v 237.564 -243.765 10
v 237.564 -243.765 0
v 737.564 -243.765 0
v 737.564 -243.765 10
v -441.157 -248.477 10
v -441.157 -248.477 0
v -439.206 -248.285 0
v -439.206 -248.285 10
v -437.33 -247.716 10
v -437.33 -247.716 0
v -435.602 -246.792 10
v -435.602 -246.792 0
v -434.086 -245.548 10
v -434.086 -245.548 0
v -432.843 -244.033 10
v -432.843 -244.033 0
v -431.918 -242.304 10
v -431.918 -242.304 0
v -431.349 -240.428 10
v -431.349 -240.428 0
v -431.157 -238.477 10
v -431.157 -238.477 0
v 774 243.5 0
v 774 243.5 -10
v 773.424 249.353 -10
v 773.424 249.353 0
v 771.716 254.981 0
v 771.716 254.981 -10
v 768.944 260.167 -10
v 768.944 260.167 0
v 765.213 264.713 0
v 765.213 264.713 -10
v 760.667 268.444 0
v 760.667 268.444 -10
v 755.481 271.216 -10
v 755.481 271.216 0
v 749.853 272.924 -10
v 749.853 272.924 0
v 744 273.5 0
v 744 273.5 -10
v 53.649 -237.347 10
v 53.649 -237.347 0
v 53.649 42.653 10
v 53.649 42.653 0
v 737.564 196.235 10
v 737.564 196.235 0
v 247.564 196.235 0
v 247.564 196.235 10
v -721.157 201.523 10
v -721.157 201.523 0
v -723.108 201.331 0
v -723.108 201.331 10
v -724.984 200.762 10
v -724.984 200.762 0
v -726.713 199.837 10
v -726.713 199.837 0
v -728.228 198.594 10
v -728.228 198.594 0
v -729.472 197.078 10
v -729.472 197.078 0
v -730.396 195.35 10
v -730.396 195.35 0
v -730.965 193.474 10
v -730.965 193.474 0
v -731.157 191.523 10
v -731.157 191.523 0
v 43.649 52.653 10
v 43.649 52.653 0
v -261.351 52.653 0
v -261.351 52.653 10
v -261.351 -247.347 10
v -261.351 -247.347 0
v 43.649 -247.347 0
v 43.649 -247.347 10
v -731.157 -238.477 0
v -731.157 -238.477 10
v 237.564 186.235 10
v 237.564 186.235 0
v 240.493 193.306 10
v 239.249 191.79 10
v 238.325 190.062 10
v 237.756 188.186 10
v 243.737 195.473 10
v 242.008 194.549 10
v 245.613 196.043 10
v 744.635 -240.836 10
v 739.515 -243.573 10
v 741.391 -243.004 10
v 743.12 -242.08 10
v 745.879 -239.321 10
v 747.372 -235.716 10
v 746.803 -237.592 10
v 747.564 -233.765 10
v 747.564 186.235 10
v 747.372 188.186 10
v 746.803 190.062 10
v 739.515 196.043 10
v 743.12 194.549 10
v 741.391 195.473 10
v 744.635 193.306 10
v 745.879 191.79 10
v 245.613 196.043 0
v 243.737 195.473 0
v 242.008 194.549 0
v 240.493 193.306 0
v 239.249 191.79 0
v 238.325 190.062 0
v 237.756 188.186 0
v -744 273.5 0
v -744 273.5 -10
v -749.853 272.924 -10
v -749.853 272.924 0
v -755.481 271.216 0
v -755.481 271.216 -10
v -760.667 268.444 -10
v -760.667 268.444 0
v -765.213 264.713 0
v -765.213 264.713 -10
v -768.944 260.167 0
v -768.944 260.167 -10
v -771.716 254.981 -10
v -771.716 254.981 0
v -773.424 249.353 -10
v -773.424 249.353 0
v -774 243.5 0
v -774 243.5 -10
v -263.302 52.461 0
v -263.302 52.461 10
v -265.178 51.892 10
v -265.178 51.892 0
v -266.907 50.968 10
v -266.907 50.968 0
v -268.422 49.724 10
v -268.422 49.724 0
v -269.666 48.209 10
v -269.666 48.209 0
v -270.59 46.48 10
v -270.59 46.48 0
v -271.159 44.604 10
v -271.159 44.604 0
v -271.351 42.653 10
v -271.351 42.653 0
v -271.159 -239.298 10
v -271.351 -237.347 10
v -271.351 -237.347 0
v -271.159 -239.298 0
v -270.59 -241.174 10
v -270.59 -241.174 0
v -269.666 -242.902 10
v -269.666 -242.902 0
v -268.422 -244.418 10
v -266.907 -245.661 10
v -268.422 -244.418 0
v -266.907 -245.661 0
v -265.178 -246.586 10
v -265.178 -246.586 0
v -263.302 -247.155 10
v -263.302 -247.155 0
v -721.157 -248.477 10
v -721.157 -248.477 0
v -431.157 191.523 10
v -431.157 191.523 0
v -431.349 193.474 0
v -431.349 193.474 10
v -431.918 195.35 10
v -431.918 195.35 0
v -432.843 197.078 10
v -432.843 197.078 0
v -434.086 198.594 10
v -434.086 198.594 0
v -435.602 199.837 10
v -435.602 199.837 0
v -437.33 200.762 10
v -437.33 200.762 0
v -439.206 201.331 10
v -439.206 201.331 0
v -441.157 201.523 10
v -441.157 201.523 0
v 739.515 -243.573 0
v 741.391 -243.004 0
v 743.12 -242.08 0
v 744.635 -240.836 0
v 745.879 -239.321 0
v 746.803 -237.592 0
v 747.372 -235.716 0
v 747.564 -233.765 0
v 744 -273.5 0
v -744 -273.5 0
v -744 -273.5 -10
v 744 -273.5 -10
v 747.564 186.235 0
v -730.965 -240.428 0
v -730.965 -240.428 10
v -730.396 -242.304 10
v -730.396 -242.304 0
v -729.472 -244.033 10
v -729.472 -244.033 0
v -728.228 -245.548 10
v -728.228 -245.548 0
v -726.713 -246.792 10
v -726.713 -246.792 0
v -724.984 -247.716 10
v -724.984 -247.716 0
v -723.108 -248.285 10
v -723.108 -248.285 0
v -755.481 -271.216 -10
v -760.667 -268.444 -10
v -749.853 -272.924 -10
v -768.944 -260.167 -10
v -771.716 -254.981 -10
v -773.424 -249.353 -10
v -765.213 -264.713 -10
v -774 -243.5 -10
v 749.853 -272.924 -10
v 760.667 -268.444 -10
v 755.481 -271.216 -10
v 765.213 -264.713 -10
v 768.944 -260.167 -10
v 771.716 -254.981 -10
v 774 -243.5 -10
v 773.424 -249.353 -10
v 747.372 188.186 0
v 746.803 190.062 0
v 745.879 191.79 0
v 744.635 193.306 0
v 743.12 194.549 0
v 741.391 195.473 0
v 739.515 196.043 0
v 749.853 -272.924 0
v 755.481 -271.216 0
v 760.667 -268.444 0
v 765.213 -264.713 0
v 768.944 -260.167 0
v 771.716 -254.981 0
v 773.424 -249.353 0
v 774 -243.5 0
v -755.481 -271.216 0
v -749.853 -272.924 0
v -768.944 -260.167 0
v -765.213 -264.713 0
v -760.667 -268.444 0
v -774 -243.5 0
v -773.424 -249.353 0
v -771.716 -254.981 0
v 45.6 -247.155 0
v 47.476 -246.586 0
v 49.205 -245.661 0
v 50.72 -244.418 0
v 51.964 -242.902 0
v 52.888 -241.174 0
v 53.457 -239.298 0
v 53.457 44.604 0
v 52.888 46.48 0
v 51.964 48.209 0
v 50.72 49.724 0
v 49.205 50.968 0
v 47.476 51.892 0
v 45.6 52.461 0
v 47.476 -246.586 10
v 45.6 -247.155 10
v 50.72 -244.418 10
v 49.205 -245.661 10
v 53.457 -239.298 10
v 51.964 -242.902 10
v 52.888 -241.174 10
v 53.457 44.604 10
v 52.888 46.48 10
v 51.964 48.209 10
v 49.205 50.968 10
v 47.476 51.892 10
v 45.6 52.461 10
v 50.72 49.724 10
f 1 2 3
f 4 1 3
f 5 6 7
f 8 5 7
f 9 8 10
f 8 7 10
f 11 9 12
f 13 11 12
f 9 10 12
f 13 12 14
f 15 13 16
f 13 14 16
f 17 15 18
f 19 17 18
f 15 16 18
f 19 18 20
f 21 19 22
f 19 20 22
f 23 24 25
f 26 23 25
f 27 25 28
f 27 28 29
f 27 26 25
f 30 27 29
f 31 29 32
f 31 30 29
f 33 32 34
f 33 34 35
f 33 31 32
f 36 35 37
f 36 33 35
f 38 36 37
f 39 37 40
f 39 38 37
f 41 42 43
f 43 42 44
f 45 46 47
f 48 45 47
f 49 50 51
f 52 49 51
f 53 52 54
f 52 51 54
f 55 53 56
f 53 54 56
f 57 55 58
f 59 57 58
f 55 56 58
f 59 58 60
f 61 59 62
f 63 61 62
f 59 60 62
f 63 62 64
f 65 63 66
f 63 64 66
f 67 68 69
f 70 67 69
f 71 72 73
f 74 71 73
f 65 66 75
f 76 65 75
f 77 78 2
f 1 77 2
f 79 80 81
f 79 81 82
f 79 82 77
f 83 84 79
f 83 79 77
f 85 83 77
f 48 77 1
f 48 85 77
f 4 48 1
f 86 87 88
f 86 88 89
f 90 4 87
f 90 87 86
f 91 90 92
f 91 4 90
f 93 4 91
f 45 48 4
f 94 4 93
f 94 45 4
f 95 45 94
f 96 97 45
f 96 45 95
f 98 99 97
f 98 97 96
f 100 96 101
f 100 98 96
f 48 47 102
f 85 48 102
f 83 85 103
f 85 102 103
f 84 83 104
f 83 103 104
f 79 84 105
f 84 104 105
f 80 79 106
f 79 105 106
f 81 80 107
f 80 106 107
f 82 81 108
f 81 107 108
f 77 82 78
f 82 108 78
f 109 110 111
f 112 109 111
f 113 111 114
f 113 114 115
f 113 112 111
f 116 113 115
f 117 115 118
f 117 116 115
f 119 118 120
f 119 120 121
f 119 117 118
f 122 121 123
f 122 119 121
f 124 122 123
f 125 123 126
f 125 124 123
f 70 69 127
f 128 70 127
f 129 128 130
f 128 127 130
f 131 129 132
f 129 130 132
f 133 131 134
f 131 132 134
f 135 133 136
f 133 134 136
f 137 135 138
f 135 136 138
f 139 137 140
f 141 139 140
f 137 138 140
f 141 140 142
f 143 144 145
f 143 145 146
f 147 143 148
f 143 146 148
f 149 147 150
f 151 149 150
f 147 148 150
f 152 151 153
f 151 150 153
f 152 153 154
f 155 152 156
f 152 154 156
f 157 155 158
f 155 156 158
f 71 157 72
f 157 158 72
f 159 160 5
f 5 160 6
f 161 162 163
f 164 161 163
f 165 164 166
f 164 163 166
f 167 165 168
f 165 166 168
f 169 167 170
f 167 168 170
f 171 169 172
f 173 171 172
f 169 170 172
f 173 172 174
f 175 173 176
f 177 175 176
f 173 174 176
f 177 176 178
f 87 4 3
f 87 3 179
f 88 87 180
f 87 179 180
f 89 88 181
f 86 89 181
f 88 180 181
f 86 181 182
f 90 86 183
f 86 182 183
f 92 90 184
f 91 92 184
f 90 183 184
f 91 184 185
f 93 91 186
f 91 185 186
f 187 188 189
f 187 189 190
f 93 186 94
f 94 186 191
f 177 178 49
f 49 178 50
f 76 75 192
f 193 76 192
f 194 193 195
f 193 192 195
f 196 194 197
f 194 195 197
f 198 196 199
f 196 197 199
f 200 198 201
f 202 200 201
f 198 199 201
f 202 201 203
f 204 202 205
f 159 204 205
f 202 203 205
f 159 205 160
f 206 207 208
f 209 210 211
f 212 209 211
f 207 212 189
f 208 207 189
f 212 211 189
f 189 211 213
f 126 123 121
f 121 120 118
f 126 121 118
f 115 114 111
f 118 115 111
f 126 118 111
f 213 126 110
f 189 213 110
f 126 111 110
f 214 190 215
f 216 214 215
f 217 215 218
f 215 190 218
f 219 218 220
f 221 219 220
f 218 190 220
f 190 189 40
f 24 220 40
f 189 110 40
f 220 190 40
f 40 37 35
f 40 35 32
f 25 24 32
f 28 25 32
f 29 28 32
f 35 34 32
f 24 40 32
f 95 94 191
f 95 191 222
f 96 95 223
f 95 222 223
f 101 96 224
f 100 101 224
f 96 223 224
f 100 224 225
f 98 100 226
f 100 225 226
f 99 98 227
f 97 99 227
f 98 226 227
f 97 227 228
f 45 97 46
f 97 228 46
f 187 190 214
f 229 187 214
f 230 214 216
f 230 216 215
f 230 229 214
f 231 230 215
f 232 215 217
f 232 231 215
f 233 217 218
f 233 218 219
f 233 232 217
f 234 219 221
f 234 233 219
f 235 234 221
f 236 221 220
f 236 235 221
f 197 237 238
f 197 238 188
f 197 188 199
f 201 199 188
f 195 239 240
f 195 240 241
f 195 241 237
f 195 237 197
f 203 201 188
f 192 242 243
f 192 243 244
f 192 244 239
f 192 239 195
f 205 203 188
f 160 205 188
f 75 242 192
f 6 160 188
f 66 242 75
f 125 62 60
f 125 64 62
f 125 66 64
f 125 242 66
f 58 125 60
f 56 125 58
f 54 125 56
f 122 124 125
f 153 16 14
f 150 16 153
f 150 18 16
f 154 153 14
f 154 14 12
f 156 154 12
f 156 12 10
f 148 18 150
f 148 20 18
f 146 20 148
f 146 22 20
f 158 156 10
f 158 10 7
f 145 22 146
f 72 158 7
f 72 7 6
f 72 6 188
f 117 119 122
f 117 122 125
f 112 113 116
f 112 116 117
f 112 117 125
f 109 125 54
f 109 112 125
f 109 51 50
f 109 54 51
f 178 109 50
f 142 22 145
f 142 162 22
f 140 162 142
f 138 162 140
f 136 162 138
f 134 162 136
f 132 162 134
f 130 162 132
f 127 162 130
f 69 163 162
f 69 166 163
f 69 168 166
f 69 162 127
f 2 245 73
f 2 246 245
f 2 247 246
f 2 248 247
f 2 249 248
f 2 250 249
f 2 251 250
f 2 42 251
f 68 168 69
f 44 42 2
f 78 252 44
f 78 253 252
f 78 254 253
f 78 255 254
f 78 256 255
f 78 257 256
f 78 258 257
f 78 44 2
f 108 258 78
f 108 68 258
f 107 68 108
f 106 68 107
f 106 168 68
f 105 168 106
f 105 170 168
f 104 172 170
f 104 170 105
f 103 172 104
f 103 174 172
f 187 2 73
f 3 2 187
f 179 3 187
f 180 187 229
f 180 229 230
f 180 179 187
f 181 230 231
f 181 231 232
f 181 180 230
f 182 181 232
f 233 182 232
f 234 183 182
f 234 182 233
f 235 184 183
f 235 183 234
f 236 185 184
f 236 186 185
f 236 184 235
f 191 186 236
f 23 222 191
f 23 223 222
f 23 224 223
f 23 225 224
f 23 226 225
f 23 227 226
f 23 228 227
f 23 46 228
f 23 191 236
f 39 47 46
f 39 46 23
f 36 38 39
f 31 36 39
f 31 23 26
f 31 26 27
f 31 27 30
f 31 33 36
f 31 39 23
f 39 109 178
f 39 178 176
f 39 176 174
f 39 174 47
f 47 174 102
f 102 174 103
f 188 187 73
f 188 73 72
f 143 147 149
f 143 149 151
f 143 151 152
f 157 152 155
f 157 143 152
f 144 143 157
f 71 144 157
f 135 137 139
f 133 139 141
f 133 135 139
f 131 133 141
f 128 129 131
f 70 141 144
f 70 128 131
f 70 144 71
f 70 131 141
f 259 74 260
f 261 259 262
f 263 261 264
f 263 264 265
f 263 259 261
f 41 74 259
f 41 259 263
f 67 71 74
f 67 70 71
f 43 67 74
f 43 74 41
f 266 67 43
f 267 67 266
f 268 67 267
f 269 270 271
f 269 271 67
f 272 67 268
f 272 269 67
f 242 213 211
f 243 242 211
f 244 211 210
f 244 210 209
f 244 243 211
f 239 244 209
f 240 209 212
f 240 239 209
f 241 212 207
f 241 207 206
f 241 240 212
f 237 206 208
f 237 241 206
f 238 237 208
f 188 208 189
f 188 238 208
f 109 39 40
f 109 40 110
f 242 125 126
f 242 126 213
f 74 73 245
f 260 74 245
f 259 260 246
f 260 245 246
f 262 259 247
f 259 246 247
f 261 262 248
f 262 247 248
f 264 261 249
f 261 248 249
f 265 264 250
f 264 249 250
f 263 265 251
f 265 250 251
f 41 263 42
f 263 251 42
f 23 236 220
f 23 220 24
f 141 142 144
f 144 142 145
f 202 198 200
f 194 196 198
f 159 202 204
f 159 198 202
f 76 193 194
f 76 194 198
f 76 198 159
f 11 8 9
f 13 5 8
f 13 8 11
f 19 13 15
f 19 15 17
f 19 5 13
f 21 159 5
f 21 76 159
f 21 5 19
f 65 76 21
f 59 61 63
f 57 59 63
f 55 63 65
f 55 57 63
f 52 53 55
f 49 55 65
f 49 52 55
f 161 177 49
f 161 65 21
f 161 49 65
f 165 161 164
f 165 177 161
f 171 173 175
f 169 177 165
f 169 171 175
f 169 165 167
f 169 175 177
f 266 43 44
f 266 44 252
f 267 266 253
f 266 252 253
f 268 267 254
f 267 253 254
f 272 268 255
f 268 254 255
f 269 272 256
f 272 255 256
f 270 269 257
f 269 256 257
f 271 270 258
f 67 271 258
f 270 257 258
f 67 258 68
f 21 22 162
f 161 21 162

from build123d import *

# Parameters (mm, degrees)
F1_DEPTH = 10
F5_DEPTH = 10
F6_DEPTH = 10
F7_DEPTH = 10


with BuildPart() as f1:
    # F0 (on Top) → F1 (new body)
    with BuildSketch(Plane.XY):
        with BuildLine():
            Line((744, 273.5), (-744, 273.5))
            ThreePointArc((-744, 273.5), (-765.213203, 264.713203), (-774, 243.5))
            Line((-774, 243.5), (-774, -243.5))
            ThreePointArc((-774, -243.5), (-765.213203, -264.713203), (-744, -273.5))
            Line((-744, -273.5), (744, -273.5))
            ThreePointArc((744, -273.5), (765.213203, -264.713203), (774, -243.5))
            Line((774, -243.5), (774, 243.5))
            ThreePointArc((774, 243.5), (765.213203, 264.713203), (744, 273.5))
        make_face()
    extrude(amount=-F1_DEPTH)

    # F2 (on face) → F5 (join)
    with BuildSketch(Plane.XY):
        with BuildLine():
            Line((237.563882, 186.23467), (237.563882, -243.76533))
            Line((237.563882, -243.76533), (737.563882, -243.76533))
            ThreePointArc((737.563882, -243.76533), (744.63495, -240.836398), (747.563882, -233.76533))
            Line((747.563882, -233.76533), (747.563882, 186.23467))
            ThreePointArc((747.563882, 186.23467), (744.63495, 193.305738), (737.563882, 196.23467))
            Line((737.563882, 196.23467), (247.563882, 196.23467))
            ThreePointArc((247.563882, 196.23467), (240.492814, 193.305738), (237.563882, 186.23467))
        make_face()
    extrude(amount=F5_DEPTH)

    # F3 (on face) → F6 (join)
    with BuildSketch(Plane.XY):
        with BuildLine():
            Line((-441.157219, 201.522775), (-721.157219, 201.522775))
            ThreePointArc((-721.157219, 201.522775), (-728.228287, 198.593843), (-731.157219, 191.522775))
            Line((-731.157219, 191.522775), (-731.157219, -238.477225))
            ThreePointArc((-731.157219, -238.477225), (-728.228287, -245.548292), (-721.157219, -248.477225))
            Line((-721.157219, -248.477225), (-441.157219, -248.477225))
            ThreePointArc((-441.157219, -248.477225), (-434.086152, -245.548292), (-431.157219, -238.477225))
            Line((-431.157219, -238.477225), (-431.157219, 191.522775))
            ThreePointArc((-431.157219, 191.522775), (-434.086152, 198.593843), (-441.157219, 201.522775))
        make_face()
    extrude(amount=F6_DEPTH)

    # F4 (on face) → F7 (join)
    with BuildSketch(Plane.XY):
        with BuildLine():
            Line((43.649018, 52.653256), (-261.350982, 52.653256))
            ThreePointArc((-261.350982, 52.653256), (-268.42205, 49.724324), (-271.350982, 42.653256))
            Line((-271.350982, 42.653256), (-271.350982, -237.346744))
            ThreePointArc((-271.350982, -237.346744), (-268.42205, -244.417812), (-261.350982, -247.346744))
            Line((-261.350982, -247.346744), (43.649018, -247.346744))
            ThreePointArc((43.649018, -247.346744), (50.720086, -244.417812), (53.649018, -237.346744))
            Line((53.649018, -237.346744), (53.649018, 42.653256))
            ThreePointArc((53.649018, 42.653256), (50.720086, 49.724324), (43.649018, 52.653256))
        make_face()
    extrude(amount=F7_DEPTH)


solid = f1.part
